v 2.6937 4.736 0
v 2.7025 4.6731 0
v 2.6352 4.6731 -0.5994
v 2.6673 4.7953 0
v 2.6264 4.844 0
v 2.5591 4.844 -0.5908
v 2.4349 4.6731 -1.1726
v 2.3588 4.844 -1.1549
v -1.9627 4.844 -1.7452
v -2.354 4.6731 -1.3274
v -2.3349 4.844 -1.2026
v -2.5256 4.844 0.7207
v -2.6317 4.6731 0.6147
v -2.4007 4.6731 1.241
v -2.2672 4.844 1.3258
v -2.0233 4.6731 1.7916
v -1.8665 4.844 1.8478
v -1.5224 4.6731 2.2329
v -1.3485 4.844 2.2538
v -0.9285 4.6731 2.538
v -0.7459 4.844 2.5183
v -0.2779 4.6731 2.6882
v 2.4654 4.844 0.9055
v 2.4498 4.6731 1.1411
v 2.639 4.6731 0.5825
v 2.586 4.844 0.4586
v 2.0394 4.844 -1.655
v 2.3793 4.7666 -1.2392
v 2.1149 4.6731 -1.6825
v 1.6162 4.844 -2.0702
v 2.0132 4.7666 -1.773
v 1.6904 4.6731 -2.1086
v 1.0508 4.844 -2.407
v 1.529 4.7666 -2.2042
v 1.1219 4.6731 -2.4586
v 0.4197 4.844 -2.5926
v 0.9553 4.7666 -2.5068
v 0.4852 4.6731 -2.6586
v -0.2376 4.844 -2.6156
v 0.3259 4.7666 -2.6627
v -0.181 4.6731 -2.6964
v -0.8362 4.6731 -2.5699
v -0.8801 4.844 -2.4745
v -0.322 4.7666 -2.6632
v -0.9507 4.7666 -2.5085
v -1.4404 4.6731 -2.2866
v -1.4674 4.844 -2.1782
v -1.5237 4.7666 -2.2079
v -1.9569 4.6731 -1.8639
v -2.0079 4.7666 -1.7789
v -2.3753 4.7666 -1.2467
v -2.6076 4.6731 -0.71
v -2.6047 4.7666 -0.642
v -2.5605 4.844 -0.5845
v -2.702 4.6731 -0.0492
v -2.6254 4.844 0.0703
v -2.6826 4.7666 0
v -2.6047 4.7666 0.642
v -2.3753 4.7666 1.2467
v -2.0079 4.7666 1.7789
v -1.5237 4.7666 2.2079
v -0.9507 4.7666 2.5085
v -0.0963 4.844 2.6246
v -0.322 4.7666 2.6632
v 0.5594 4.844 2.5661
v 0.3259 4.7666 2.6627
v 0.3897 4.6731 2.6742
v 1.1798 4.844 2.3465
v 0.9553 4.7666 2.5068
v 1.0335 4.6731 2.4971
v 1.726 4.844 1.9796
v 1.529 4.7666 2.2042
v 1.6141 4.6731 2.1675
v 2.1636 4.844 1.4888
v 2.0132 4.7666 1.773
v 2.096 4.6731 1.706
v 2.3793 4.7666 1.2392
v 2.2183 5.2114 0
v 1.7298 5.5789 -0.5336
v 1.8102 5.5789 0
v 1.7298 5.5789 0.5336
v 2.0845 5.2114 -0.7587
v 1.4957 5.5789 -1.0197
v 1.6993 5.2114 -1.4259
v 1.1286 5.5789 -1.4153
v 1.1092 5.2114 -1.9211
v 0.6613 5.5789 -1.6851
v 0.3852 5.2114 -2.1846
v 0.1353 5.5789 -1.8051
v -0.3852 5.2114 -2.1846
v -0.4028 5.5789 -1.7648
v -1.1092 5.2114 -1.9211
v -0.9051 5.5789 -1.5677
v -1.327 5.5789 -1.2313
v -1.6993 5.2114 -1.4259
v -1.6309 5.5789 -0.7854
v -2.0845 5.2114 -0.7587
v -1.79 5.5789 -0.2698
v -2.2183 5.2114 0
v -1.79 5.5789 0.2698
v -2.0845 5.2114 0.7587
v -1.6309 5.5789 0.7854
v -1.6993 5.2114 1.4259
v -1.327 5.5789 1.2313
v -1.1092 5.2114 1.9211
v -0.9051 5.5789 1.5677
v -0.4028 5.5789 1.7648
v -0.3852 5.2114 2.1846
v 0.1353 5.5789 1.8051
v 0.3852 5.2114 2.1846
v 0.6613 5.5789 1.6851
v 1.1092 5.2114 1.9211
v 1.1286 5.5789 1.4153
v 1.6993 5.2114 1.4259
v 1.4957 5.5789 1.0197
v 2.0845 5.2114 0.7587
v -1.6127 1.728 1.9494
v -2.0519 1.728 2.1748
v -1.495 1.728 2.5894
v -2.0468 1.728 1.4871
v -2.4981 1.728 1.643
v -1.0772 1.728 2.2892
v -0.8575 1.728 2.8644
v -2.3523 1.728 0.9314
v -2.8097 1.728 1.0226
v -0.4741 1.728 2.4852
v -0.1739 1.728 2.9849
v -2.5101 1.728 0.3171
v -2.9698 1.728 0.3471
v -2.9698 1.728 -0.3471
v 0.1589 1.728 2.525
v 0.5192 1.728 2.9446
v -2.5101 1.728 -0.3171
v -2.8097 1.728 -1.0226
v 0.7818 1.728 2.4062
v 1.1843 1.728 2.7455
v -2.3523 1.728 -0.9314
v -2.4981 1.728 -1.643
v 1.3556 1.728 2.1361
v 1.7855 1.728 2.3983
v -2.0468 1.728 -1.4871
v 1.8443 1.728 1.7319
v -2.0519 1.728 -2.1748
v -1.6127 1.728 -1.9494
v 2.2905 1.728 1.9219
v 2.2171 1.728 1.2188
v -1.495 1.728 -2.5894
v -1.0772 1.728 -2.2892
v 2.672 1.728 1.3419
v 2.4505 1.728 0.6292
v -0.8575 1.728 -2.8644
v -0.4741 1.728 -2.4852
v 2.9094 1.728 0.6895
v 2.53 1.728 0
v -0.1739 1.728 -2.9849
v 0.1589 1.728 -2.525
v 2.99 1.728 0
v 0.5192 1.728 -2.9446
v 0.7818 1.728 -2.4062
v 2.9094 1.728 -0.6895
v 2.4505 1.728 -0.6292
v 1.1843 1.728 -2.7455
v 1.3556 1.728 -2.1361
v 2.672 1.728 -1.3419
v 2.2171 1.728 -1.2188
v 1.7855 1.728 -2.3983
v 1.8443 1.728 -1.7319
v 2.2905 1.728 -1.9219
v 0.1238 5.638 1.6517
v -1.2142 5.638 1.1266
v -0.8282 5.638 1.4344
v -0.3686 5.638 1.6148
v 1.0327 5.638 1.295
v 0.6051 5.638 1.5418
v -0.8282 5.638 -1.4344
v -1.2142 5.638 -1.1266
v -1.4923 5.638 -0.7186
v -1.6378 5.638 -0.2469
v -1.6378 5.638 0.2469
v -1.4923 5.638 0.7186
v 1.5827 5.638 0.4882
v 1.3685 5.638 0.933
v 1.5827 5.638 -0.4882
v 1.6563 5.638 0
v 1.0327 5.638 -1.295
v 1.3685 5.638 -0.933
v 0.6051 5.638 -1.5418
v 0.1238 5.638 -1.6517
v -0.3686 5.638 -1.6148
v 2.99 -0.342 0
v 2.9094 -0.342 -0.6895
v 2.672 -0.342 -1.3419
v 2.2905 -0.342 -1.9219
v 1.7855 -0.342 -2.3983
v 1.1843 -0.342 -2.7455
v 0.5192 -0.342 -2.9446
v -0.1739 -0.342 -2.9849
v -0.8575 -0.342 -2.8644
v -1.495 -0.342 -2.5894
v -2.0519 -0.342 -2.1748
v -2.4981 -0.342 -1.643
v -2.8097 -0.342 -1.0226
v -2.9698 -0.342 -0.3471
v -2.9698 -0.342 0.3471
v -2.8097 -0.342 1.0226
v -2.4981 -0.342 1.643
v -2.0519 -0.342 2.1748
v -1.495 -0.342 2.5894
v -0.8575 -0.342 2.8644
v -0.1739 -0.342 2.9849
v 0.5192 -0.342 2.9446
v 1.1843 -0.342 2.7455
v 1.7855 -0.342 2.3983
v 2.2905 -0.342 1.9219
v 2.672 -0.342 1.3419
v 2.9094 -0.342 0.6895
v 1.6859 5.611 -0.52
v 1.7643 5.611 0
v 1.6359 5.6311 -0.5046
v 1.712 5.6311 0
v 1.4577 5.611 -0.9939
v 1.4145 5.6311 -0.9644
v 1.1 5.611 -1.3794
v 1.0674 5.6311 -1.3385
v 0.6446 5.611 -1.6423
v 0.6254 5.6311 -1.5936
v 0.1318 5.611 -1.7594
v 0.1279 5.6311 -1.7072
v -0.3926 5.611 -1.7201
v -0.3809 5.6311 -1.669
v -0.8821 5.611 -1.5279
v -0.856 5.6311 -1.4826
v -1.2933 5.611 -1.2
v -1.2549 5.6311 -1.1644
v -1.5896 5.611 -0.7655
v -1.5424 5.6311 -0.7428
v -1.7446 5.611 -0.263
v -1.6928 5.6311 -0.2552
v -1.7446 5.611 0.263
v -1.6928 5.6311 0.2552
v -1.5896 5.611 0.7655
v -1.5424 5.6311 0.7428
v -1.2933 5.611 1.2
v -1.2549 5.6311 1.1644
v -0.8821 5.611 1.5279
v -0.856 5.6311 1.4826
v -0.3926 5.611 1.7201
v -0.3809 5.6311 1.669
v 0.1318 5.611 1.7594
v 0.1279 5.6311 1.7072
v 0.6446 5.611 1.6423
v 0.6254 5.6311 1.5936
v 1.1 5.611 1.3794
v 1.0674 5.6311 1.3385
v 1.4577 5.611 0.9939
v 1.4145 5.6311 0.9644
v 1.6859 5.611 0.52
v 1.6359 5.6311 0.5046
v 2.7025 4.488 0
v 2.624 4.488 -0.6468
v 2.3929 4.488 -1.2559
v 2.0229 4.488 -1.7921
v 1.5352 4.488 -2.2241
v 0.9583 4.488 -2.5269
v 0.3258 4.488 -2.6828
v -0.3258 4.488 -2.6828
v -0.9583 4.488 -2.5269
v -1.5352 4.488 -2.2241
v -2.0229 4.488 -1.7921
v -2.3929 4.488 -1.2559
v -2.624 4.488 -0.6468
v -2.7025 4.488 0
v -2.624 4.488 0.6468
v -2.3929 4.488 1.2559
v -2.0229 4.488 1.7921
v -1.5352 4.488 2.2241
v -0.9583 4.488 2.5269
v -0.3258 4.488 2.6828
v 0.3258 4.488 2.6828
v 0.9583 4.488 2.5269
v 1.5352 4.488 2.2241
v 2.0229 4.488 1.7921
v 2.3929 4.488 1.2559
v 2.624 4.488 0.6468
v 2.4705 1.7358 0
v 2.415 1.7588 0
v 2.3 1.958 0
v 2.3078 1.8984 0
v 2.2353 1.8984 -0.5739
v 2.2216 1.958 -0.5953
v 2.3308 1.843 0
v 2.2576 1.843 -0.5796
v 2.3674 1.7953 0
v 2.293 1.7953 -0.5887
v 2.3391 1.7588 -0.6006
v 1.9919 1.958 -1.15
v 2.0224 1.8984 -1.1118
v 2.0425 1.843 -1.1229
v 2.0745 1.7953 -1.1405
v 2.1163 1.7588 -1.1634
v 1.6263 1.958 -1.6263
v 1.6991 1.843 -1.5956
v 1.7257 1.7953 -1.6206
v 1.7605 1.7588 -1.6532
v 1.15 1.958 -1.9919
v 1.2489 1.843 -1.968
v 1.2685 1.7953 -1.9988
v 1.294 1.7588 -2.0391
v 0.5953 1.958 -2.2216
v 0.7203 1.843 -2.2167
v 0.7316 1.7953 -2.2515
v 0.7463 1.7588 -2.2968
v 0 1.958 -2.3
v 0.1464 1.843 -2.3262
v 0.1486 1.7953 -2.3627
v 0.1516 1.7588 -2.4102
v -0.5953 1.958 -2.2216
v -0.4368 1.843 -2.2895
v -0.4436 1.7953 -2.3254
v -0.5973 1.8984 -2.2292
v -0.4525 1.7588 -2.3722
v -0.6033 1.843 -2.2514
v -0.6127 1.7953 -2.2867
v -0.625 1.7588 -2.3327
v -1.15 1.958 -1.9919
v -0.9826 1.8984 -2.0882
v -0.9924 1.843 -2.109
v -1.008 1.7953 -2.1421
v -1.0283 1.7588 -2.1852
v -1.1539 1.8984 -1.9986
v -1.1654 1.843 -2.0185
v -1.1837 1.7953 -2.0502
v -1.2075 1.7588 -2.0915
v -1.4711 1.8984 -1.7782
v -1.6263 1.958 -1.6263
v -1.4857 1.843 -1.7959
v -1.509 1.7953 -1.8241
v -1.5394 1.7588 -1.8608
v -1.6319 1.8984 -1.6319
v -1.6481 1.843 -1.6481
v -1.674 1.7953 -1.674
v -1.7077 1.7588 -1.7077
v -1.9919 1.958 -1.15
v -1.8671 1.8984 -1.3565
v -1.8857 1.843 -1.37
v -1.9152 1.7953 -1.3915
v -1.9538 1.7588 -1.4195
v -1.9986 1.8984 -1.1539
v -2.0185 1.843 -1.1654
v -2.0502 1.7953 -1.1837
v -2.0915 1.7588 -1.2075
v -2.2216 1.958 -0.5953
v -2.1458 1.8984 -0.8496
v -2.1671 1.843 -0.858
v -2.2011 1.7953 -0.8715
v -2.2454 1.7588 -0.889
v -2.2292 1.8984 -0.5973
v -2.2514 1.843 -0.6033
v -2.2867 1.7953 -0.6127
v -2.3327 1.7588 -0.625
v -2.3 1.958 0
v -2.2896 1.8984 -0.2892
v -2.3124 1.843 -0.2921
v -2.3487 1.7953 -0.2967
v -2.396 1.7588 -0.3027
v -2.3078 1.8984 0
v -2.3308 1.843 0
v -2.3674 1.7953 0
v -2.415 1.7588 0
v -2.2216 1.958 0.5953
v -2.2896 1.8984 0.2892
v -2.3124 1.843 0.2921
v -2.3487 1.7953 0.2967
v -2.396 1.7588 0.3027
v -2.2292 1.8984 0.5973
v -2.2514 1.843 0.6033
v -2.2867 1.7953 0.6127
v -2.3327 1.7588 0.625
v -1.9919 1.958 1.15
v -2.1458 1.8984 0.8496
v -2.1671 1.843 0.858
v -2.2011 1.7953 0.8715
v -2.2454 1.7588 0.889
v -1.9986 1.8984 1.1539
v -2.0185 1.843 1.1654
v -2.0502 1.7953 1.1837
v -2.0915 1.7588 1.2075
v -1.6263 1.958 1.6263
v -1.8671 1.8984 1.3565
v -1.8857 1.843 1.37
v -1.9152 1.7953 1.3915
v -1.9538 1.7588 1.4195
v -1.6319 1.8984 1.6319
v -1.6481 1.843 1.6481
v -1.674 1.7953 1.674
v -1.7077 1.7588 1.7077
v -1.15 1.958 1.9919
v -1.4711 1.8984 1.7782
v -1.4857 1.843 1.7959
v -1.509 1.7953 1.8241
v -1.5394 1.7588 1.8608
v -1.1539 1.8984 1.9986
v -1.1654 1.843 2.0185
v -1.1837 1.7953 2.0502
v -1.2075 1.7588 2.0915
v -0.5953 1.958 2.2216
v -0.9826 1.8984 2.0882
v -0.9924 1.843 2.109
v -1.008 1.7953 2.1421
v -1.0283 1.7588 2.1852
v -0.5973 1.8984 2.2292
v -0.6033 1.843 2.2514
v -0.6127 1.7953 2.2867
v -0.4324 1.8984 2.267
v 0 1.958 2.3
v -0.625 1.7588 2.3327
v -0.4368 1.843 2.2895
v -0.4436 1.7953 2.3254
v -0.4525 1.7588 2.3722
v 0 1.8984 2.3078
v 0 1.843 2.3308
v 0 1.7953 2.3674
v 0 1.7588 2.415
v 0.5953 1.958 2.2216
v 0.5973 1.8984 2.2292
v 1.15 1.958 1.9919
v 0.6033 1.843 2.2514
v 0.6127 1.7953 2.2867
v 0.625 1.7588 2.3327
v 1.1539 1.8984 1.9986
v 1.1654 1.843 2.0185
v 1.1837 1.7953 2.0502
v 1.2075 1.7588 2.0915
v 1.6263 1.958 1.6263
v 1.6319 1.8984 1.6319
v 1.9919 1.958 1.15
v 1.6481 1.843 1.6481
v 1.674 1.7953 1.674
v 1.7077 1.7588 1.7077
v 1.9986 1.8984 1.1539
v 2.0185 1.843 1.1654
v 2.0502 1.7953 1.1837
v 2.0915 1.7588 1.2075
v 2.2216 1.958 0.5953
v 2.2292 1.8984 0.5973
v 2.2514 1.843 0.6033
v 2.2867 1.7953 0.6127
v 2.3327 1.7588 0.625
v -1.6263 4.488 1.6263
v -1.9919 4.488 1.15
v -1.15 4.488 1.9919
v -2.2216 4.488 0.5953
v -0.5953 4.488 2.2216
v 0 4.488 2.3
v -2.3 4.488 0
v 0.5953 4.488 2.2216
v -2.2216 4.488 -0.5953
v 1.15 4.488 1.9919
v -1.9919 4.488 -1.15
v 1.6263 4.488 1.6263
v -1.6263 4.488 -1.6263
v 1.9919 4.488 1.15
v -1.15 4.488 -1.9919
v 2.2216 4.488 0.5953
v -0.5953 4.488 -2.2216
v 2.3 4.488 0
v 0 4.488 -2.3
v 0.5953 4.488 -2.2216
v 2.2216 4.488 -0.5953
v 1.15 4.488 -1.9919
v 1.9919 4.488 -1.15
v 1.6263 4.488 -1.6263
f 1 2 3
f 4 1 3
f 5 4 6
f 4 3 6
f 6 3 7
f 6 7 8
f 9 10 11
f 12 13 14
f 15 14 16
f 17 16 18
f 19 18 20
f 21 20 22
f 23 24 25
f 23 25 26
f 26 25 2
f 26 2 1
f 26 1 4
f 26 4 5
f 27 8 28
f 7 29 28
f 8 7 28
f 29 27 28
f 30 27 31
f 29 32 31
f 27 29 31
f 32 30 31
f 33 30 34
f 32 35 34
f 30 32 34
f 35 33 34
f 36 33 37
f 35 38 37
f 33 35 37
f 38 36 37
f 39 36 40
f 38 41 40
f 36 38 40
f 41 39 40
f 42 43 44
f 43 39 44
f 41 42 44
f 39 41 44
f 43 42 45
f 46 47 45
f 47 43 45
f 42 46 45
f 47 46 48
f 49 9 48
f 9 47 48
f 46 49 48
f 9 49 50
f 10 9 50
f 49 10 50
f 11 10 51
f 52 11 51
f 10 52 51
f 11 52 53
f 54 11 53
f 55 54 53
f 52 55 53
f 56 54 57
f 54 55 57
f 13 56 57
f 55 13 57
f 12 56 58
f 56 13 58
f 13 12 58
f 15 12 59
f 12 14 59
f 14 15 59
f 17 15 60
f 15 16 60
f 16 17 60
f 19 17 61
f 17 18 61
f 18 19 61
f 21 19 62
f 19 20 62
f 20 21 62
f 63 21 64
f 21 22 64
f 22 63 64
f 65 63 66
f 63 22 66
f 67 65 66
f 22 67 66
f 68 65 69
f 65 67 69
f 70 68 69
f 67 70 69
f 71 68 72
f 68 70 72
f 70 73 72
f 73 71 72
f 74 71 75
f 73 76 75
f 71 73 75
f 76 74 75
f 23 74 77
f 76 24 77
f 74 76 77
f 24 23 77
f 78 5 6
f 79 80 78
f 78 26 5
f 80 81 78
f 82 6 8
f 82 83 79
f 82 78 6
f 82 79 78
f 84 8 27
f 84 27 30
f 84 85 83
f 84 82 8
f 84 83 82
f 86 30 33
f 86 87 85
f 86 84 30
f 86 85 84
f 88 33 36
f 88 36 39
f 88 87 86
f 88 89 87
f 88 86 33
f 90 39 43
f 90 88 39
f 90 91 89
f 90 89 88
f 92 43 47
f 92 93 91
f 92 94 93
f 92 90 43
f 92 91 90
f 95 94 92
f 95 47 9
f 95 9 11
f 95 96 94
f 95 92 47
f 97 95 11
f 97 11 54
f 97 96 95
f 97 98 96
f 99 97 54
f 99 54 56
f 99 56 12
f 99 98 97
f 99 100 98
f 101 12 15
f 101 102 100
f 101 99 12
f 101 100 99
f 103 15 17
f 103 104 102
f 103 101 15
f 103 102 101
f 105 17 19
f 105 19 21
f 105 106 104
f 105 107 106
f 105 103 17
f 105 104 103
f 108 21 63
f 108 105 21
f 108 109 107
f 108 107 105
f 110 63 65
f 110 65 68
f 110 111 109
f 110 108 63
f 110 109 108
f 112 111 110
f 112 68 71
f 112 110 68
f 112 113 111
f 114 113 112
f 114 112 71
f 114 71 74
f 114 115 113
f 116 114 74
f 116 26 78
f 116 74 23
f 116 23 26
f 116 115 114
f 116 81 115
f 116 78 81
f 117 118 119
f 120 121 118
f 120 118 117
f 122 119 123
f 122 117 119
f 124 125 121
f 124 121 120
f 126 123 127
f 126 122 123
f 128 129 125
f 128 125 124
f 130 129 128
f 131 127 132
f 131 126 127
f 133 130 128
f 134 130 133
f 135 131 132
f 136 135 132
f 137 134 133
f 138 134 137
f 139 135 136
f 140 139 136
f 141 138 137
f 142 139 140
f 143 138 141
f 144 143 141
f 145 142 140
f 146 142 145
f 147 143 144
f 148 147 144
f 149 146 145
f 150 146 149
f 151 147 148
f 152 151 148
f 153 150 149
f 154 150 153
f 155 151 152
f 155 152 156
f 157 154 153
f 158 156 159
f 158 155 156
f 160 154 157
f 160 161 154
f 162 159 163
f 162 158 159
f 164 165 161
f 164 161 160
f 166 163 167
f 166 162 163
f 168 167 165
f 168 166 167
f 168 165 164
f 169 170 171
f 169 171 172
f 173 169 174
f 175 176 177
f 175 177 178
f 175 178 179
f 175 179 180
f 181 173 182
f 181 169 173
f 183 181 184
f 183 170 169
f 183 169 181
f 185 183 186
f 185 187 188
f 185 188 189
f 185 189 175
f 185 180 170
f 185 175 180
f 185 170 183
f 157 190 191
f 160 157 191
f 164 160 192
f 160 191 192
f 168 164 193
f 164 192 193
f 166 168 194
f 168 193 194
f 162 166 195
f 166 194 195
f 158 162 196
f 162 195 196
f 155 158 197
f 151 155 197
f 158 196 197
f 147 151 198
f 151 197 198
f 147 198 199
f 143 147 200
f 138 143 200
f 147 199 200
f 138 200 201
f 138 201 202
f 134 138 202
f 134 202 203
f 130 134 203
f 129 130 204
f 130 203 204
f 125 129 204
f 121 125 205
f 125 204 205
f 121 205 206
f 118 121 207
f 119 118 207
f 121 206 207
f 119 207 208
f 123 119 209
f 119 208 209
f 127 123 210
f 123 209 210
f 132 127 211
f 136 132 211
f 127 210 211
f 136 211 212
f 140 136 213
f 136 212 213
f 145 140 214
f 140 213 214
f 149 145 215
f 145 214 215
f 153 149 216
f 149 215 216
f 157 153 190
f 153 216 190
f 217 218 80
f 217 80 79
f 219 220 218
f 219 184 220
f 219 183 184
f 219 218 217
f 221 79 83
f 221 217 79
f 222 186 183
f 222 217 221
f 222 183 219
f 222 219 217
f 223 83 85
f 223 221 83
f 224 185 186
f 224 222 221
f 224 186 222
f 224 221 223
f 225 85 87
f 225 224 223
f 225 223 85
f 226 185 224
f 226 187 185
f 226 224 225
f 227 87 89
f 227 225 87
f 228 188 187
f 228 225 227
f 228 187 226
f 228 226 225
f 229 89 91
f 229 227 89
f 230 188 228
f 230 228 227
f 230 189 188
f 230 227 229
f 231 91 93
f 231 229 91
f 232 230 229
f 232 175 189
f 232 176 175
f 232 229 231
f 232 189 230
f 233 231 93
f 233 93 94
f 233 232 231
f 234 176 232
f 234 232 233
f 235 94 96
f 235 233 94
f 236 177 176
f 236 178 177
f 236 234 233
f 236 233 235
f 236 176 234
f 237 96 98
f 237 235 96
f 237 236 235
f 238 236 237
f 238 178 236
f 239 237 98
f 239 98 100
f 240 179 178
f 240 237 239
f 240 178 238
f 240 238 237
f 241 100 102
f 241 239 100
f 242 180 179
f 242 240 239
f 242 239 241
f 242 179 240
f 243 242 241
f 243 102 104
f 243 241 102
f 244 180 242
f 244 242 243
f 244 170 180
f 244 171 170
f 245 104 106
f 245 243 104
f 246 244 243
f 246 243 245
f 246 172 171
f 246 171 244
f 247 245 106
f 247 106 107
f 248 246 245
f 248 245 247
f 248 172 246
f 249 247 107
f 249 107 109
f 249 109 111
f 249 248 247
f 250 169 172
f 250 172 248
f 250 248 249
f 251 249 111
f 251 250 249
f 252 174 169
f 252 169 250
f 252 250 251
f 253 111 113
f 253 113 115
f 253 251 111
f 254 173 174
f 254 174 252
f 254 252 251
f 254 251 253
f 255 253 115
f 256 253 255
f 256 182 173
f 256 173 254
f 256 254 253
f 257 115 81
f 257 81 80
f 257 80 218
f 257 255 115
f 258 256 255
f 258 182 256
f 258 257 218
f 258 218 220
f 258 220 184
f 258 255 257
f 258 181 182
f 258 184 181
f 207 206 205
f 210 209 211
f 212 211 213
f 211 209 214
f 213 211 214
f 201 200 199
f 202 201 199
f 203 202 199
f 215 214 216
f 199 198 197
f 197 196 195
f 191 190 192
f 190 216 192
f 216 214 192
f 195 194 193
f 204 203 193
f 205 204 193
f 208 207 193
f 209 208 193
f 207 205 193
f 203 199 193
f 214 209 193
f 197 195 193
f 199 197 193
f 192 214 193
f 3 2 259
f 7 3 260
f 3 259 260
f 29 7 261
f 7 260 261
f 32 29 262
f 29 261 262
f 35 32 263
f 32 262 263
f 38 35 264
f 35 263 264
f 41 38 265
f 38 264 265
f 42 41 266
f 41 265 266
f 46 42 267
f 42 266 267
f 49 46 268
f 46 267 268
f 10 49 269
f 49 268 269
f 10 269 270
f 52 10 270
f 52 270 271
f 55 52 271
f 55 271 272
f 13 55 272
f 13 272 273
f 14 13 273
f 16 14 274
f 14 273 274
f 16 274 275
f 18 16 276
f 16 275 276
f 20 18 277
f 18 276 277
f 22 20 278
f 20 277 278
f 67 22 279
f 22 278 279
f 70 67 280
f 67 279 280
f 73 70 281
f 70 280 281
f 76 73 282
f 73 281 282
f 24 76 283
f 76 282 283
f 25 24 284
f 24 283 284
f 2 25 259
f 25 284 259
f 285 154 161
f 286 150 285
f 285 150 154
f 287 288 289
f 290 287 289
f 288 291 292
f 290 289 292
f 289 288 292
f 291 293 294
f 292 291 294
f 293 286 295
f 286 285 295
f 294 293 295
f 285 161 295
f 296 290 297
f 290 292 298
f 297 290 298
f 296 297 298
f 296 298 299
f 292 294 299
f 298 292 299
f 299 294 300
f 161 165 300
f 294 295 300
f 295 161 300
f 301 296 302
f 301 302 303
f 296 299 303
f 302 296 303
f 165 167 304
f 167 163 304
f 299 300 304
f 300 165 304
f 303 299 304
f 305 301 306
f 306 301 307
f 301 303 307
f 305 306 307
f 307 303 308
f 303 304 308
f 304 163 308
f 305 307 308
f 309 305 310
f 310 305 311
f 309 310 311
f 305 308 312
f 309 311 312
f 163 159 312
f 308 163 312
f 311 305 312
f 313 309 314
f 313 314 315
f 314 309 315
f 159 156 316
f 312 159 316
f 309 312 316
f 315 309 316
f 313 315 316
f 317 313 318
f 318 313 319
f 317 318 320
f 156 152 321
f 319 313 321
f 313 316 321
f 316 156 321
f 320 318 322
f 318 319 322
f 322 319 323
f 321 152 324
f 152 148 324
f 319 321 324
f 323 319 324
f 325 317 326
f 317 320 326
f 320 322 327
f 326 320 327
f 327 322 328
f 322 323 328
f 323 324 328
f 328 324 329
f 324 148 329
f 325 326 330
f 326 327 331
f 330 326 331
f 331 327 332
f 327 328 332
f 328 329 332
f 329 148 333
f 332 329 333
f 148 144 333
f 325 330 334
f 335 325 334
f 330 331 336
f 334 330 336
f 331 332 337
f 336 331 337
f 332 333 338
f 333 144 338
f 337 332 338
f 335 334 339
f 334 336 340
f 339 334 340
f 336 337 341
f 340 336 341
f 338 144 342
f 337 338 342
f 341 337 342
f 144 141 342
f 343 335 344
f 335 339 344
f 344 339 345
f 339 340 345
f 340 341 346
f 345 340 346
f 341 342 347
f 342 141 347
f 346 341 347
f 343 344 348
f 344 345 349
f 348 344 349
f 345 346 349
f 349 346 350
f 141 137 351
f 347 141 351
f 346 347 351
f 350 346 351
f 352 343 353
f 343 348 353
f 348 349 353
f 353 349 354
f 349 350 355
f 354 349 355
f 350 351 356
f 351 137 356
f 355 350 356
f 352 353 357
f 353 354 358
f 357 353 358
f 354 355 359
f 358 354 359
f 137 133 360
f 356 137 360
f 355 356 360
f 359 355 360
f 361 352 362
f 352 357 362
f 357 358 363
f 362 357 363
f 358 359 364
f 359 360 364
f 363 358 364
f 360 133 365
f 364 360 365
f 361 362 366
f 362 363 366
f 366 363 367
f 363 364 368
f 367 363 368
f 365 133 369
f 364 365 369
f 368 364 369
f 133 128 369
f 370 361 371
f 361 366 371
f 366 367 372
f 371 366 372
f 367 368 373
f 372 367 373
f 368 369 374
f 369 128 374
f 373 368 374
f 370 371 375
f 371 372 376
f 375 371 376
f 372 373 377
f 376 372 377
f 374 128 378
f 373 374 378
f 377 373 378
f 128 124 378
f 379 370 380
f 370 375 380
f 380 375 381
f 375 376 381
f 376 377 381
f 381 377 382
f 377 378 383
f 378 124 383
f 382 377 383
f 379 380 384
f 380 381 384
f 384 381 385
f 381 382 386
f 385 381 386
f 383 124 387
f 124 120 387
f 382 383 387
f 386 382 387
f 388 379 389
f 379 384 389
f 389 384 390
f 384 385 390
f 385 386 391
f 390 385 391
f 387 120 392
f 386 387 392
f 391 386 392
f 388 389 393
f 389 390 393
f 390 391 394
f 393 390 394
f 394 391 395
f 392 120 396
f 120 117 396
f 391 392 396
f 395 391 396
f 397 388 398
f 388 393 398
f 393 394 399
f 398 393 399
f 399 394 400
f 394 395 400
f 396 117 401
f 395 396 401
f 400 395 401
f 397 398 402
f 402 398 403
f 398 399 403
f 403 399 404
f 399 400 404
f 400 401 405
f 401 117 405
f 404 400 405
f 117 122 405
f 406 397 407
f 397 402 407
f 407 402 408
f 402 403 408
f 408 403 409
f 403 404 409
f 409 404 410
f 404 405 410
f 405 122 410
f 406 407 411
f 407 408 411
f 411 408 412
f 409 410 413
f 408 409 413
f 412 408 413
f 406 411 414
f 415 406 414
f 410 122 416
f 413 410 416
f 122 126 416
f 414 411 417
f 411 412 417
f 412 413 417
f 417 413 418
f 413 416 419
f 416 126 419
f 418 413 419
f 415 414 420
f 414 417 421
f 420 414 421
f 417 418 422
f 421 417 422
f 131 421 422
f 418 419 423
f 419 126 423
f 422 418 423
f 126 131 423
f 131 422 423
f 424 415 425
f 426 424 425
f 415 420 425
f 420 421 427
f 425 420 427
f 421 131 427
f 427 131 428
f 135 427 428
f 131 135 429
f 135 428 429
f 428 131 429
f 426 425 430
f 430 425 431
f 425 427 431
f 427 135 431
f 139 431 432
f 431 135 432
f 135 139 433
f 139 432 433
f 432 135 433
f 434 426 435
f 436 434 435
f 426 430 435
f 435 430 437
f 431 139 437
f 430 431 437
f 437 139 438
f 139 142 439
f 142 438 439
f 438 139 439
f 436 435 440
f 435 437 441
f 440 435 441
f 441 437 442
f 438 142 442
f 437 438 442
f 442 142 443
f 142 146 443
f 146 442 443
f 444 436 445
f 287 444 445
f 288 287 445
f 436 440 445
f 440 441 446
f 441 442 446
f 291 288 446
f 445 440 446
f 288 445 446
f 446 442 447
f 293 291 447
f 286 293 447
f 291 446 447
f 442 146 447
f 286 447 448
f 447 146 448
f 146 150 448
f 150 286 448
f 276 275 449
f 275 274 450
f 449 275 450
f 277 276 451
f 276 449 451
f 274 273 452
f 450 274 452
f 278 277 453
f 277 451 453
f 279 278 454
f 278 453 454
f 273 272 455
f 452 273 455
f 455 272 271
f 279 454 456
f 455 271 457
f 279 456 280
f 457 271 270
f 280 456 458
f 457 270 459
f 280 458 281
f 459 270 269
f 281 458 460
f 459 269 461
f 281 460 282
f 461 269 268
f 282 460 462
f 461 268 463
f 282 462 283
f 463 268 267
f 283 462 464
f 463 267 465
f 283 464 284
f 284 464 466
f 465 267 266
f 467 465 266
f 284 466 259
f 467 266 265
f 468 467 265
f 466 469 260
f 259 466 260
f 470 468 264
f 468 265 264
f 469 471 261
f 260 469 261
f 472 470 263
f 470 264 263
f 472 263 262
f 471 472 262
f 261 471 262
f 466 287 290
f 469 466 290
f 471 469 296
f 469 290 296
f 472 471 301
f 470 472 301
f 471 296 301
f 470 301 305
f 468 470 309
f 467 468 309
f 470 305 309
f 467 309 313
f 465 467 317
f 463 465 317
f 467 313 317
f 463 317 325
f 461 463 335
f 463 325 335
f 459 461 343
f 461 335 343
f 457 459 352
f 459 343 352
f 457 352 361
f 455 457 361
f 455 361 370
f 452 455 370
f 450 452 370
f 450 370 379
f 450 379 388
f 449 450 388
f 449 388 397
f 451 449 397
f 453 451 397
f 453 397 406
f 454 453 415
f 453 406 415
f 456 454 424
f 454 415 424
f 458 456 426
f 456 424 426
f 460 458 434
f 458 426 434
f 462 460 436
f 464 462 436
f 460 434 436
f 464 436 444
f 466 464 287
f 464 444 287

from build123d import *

# Parameters (mm, degrees)
SKETCH1_R           = 2.6
BOSS_EXTRUDE1_DEPTH = 1.8
SKETCH2_R           = 2
BOSS_EXTRUDE2_DEPTH = 2.4
SKETCH3_R           = 2.35
BOSS_EXTRUDE3_DEPTH = 1
CHAMFER1_SIZE       = 0.75
CHAMFER1_SIZE2      = 0.832959386
FILLET1_R           = 0.2
SCALE1_SCALE        = 1.15


with BuildPart() as part:
    # Sketch1 → Boss-Extrude1 (new body)
    with BuildSketch(Plane(origin=(0, 0, 0), x_dir=(1, 0, 0), z_dir=(0, 1, 0))):
        Circle(SKETCH1_R)
    extrude(amount=BOSS_EXTRUDE1_DEPTH)

    # Sketch2 → Boss-Extrude2 (add)
    with BuildSketch(Plane(origin=(0, 1.8, 0), x_dir=(1, 0, 0), z_dir=(0, 1, 0))):
        Circle(SKETCH2_R)
    extrude(amount=BOSS_EXTRUDE2_DEPTH)

    # Sketch3 → Boss-Extrude3 (add)
    with BuildSketch(Plane(origin=(0, 4.2, 0), x_dir=(1, 0, 0), z_dir=(0, 1, 0))):
        Circle(SKETCH3_R)
    extrude(amount=BOSS_EXTRUDE3_DEPTH)

    # Chamfer1
    chamfer1_edges = [part.edges().sort_by_distance(p)[0] for p in [
        (-2.35, 5.2, 0),
    ]]
    chamfer1_side = [part.faces().sort_by_distance(p)[0] for p in [
        (-2.35, 4.7, 0),
    ]]
    chamfer(chamfer1_edges, length=CHAMFER1_SIZE, length2=CHAMFER1_SIZE2, reference=chamfer1_side[0])

    # Fillet1
    fillet1_edges = [part.edges().sort_by_distance(p)[0] for p in [
        (-1.517040614, 5.2, 0),
        (-2.35, 4.45, 0),
        (-2, 1.8, 0),
    ]]
    fillet(fillet1_edges, radius=FILLET1_R)


with BuildPart() as part_1:
    # Scale1: scaled about (-4.2e-08, 2.280257944, 0)
    add(part.part.scale(SCALE1_SCALE).moved(Location((6e-09, -0.342038692, 0))))


solid = part_1.part
